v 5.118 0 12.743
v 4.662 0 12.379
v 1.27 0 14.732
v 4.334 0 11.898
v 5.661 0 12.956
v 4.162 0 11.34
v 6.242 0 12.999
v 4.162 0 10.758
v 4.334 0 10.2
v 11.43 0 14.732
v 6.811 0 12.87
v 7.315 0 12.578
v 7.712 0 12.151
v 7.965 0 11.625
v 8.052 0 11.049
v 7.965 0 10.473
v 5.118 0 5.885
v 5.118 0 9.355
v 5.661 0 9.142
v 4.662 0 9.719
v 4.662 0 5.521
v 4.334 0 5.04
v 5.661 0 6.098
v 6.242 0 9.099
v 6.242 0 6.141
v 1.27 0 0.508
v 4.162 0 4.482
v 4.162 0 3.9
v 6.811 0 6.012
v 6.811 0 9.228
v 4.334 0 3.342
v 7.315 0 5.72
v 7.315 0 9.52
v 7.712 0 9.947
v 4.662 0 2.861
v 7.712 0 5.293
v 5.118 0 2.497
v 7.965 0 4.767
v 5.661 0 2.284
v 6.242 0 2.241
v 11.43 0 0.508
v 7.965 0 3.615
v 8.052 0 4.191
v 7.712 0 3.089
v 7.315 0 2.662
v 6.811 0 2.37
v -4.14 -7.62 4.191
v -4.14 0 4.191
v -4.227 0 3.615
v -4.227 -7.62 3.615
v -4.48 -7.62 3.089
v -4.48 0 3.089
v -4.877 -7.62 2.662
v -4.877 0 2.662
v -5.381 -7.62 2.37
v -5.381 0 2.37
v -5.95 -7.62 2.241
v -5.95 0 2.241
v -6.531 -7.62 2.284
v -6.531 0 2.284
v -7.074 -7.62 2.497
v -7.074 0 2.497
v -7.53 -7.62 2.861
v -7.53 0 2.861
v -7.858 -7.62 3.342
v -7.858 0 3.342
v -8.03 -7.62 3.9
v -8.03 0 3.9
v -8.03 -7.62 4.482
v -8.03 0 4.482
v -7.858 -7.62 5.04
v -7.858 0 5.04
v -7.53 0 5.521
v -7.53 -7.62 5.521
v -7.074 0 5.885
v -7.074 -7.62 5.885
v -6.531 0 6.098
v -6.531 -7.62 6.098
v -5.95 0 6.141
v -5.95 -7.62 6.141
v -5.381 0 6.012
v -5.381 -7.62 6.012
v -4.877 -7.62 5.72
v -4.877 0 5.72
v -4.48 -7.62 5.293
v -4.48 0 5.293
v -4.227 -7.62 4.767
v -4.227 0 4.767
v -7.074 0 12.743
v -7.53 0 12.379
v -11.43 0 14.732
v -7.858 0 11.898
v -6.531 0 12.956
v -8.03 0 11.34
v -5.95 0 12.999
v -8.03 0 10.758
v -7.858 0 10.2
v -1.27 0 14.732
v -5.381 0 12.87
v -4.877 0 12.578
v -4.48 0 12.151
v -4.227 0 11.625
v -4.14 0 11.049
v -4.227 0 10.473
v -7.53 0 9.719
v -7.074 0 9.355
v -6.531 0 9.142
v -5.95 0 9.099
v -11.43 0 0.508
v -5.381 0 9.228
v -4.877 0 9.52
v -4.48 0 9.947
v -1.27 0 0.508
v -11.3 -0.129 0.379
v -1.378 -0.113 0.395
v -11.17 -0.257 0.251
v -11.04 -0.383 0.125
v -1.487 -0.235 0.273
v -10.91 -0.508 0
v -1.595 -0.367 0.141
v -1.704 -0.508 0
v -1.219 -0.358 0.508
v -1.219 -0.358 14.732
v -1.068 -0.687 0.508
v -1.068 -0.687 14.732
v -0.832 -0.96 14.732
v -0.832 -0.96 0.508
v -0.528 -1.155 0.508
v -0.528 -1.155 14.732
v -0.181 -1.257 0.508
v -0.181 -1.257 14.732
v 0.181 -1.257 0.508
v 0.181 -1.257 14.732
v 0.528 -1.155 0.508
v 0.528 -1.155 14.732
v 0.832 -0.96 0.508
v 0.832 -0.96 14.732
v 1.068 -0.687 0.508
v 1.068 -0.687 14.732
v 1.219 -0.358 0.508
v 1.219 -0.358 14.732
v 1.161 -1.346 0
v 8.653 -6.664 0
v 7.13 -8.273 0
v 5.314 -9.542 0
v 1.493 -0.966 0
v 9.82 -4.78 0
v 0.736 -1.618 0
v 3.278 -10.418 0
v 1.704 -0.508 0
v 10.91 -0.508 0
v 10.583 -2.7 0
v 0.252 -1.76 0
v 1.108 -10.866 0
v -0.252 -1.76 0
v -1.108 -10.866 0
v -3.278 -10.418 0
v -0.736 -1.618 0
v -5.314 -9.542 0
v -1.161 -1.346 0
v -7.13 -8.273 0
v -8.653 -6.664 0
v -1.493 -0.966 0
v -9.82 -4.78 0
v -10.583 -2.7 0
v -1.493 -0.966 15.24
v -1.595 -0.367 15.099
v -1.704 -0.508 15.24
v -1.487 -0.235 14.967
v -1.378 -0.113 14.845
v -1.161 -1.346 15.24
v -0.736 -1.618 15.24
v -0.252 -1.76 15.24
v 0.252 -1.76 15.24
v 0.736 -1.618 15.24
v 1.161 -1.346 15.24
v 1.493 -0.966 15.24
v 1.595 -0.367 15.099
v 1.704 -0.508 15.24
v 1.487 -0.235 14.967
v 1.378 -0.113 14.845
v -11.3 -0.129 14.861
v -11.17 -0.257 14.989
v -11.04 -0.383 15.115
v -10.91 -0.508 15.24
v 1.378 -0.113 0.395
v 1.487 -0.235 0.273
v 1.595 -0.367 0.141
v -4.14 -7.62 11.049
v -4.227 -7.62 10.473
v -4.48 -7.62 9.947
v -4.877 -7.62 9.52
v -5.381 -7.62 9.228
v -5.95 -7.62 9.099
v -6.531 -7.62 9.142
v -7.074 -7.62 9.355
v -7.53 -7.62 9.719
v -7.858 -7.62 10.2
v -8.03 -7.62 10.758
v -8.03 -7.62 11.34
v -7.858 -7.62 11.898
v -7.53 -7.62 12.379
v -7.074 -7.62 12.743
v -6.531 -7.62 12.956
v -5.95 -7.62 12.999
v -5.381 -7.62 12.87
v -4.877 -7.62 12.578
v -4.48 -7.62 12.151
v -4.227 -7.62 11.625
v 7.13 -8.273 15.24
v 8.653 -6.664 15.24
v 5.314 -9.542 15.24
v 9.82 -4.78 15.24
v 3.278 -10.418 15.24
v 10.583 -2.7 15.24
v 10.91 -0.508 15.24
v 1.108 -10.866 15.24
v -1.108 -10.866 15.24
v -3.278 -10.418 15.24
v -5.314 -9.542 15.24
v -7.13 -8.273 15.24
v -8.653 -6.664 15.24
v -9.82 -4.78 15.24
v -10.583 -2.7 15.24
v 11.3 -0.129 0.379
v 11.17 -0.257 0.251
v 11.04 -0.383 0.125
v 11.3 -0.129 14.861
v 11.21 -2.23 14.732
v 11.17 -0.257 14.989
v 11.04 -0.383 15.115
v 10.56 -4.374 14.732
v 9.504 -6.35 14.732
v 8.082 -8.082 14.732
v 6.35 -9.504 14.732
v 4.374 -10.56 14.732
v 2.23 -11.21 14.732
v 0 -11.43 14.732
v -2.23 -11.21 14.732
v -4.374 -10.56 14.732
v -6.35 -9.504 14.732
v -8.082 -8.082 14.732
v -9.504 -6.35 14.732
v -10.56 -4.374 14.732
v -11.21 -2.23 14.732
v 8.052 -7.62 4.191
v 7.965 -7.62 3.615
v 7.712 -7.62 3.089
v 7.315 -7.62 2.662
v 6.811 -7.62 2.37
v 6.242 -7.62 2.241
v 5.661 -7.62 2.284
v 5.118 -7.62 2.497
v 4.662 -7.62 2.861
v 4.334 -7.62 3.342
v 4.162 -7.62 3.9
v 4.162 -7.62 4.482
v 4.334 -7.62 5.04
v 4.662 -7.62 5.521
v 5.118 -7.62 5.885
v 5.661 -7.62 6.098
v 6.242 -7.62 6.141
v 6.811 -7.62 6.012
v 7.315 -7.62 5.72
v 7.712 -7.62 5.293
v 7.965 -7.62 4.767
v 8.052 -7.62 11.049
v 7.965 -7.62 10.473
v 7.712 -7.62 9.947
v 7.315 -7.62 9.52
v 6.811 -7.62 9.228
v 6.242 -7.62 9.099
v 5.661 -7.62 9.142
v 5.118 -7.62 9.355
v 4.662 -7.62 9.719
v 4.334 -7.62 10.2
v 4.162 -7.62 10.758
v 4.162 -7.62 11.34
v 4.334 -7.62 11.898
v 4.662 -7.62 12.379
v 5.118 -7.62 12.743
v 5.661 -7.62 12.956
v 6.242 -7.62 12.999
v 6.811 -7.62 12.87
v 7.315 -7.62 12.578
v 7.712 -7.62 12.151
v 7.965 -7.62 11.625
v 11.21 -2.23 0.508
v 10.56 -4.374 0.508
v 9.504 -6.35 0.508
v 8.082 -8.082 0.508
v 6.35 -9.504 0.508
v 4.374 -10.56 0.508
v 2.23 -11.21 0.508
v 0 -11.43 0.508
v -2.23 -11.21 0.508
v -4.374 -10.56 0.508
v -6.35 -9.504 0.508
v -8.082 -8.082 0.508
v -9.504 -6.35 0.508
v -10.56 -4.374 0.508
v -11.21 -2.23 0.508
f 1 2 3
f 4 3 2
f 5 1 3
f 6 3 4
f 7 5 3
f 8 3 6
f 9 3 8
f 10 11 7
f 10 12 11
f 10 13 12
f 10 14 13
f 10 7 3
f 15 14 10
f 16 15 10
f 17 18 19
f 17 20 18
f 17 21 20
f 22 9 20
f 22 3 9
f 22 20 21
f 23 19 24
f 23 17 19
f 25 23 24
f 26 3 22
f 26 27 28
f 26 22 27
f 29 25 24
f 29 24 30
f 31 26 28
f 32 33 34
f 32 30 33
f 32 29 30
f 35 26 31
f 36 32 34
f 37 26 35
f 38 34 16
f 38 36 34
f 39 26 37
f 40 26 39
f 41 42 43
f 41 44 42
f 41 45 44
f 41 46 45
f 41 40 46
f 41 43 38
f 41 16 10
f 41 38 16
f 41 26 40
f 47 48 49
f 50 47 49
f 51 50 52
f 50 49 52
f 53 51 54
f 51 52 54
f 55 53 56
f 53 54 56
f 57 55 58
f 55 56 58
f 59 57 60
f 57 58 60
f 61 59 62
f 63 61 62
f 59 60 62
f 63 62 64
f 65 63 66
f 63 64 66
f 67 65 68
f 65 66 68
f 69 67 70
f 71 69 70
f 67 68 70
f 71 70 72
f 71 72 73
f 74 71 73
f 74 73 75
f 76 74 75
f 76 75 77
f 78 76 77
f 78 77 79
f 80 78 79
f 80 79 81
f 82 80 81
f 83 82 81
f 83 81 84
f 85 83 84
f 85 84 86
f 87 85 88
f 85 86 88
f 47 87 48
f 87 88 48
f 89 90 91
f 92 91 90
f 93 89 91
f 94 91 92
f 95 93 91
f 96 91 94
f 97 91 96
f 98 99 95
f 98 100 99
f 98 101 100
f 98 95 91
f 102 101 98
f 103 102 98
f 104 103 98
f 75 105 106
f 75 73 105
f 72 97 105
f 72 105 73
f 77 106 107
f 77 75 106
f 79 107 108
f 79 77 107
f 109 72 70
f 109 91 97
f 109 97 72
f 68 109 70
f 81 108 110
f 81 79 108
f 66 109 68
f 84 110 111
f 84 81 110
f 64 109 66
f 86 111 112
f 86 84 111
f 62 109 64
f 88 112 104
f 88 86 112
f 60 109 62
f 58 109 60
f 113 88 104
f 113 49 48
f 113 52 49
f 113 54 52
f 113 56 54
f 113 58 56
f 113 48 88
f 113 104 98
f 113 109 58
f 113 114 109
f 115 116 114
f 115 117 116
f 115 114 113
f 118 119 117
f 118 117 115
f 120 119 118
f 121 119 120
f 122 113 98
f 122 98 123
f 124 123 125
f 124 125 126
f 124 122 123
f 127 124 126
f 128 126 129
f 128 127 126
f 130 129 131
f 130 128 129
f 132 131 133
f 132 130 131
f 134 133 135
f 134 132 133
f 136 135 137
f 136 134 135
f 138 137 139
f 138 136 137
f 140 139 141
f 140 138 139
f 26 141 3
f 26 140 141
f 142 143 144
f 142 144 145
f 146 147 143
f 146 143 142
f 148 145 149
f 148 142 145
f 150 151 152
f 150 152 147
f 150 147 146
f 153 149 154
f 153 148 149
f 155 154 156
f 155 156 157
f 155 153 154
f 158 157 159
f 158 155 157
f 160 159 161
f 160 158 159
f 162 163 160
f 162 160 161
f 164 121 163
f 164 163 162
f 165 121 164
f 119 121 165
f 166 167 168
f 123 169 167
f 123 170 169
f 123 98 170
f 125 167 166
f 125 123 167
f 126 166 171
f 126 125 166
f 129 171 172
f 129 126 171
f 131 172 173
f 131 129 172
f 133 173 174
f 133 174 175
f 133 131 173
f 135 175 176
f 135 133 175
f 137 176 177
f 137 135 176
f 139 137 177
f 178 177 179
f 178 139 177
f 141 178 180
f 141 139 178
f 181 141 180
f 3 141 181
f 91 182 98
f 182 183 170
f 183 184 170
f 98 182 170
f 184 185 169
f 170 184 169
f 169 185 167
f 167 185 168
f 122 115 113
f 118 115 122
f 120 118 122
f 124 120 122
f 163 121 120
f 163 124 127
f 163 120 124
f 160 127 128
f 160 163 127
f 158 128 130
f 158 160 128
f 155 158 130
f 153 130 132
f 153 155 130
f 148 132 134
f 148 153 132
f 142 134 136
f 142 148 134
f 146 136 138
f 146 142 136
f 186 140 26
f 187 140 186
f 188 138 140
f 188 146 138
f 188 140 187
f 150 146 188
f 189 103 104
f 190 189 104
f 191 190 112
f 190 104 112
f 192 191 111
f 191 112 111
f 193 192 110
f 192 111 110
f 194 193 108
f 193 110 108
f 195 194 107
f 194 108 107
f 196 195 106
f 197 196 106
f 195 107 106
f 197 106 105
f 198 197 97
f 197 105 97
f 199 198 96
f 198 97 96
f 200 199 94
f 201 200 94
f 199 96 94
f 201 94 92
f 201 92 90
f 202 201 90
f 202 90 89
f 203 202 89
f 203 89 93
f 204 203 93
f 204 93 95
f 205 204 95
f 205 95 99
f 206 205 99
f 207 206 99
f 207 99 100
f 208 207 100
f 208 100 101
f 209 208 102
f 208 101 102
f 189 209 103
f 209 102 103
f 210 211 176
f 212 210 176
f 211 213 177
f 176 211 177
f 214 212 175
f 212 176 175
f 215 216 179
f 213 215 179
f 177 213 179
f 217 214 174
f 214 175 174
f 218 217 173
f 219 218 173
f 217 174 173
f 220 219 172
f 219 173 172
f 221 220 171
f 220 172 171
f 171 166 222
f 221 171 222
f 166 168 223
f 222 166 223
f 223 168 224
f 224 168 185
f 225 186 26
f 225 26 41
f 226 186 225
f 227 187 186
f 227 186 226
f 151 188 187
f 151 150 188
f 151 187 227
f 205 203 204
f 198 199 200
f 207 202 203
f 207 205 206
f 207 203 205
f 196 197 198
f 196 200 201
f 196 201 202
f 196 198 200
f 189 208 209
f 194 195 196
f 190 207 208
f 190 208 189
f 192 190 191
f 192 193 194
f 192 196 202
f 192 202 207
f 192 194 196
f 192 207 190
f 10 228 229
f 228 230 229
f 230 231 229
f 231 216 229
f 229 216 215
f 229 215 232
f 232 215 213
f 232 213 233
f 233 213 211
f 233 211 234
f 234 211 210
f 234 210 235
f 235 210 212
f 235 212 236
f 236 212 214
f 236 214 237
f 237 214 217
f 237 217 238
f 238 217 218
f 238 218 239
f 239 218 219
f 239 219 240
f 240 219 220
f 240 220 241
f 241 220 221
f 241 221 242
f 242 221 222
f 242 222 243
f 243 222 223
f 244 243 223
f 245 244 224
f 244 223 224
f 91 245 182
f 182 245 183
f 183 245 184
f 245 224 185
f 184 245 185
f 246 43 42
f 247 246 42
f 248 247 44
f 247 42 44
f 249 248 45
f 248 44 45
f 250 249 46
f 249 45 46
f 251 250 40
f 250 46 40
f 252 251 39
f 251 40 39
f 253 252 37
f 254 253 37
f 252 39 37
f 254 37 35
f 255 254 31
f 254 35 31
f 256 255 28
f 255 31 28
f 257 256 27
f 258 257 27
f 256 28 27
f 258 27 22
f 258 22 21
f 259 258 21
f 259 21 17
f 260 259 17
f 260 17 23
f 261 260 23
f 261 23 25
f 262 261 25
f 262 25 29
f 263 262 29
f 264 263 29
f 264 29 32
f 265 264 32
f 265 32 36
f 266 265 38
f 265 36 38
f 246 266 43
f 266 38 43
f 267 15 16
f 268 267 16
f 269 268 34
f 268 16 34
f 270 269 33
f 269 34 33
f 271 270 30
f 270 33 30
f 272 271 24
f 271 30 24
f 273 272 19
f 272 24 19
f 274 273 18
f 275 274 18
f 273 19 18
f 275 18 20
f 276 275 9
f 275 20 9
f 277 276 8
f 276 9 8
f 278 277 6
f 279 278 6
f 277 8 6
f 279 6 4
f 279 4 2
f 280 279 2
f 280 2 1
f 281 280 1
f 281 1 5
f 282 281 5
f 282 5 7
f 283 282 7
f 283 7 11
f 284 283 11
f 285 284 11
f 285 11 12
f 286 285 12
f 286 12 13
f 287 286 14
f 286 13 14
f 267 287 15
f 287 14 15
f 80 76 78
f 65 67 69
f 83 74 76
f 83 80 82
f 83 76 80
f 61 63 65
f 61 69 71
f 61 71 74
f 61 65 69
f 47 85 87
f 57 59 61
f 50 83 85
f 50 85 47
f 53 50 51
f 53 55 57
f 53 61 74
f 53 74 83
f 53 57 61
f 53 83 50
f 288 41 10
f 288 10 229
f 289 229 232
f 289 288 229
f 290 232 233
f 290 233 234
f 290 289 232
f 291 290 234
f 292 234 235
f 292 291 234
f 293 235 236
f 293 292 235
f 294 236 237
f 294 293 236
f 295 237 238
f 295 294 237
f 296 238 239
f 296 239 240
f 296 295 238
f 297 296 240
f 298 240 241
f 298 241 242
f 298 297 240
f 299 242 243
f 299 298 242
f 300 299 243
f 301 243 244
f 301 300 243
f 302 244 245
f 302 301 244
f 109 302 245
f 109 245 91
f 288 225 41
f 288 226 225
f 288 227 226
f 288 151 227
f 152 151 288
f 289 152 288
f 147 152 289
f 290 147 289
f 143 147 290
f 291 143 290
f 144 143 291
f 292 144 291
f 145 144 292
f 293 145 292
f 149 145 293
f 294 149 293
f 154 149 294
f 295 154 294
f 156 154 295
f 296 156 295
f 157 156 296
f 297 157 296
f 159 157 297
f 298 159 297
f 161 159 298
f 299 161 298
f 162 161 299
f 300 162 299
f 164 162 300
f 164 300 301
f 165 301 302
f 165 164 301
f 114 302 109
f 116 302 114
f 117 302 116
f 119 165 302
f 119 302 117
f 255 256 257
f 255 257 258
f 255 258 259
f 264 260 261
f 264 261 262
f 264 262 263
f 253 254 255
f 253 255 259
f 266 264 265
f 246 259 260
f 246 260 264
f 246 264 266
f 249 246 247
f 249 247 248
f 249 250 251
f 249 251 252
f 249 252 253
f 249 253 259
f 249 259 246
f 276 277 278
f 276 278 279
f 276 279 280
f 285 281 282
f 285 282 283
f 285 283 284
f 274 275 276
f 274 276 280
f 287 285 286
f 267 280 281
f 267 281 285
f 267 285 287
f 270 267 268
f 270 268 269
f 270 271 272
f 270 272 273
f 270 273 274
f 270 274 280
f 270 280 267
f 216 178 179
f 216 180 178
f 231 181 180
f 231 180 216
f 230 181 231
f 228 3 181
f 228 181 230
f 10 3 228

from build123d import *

# Parameters (mm, degrees)
BOSS_EXTRUDE2_DEPTH = 15.24
CHAMFER1_SIZE       = 0.508
CHAMFER2_SIZE       = 0.508
SKETCH13_R          = 1.9558
CUT_EXTRUDE1_DEPTH  = 7.62


with BuildPart() as part:
    # Sketch9 → Boss-Extrude2 (new body)
    with BuildSketch(Plane.XY):
        with BuildLine():
            Line((-11.43, 0), (-1.27, 0))
            ThreePointArc((-1.27, 0), (0, -1.27), (1.27, 0))
            Line((1.27, 0), (11.43, 0))
            ThreePointArc((11.43, 0), (0, -11.43), (-11.43, 0))
        make_face()
    extrude(amount=BOSS_EXTRUDE2_DEPTH)

    # Chamfer1
    chamfer1_edges = [part.edges().sort_by_distance(p)[0] for p in [
        (6.35, 0, 0),
        (0, -11.43, 0),
        (-6.35, 0, 0),
        (0, -1.27, 0),
    ]]
    chamfer(chamfer1_edges, length=CHAMFER1_SIZE)

    # Chamfer2
    chamfer2_edges = [part.edges().sort_by_distance(p)[0] for p in [
        (0, -11.43, 15.24),
        (6.35, 0, 15.24),
        (0, -1.27, 15.24),
        (-6.35, 0, 15.24),
    ]]
    chamfer(chamfer2_edges, length=CHAMFER2_SIZE)

    # Sketch13 → Cut-Extrude1 (cut)
    with BuildSketch(Plane(origin=(0, 0, 0), x_dir=(1, 0, 0), z_dir=(0, 1, 0))):
        with Locations((-6.096, -4.191)):
            Circle(SKETCH13_R)
        with Locations((-6.096, -11.049)):
            Circle(SKETCH13_R)
        with Locations((6.096, -11.049)):
            Circle(SKETCH13_R)
        with Locations((6.096, -4.191)):
            Circle(SKETCH13_R)
    extrude(amount=-CUT_EXTRUDE1_DEPTH, mode=Mode.SUBTRACT)


solid = part.part
